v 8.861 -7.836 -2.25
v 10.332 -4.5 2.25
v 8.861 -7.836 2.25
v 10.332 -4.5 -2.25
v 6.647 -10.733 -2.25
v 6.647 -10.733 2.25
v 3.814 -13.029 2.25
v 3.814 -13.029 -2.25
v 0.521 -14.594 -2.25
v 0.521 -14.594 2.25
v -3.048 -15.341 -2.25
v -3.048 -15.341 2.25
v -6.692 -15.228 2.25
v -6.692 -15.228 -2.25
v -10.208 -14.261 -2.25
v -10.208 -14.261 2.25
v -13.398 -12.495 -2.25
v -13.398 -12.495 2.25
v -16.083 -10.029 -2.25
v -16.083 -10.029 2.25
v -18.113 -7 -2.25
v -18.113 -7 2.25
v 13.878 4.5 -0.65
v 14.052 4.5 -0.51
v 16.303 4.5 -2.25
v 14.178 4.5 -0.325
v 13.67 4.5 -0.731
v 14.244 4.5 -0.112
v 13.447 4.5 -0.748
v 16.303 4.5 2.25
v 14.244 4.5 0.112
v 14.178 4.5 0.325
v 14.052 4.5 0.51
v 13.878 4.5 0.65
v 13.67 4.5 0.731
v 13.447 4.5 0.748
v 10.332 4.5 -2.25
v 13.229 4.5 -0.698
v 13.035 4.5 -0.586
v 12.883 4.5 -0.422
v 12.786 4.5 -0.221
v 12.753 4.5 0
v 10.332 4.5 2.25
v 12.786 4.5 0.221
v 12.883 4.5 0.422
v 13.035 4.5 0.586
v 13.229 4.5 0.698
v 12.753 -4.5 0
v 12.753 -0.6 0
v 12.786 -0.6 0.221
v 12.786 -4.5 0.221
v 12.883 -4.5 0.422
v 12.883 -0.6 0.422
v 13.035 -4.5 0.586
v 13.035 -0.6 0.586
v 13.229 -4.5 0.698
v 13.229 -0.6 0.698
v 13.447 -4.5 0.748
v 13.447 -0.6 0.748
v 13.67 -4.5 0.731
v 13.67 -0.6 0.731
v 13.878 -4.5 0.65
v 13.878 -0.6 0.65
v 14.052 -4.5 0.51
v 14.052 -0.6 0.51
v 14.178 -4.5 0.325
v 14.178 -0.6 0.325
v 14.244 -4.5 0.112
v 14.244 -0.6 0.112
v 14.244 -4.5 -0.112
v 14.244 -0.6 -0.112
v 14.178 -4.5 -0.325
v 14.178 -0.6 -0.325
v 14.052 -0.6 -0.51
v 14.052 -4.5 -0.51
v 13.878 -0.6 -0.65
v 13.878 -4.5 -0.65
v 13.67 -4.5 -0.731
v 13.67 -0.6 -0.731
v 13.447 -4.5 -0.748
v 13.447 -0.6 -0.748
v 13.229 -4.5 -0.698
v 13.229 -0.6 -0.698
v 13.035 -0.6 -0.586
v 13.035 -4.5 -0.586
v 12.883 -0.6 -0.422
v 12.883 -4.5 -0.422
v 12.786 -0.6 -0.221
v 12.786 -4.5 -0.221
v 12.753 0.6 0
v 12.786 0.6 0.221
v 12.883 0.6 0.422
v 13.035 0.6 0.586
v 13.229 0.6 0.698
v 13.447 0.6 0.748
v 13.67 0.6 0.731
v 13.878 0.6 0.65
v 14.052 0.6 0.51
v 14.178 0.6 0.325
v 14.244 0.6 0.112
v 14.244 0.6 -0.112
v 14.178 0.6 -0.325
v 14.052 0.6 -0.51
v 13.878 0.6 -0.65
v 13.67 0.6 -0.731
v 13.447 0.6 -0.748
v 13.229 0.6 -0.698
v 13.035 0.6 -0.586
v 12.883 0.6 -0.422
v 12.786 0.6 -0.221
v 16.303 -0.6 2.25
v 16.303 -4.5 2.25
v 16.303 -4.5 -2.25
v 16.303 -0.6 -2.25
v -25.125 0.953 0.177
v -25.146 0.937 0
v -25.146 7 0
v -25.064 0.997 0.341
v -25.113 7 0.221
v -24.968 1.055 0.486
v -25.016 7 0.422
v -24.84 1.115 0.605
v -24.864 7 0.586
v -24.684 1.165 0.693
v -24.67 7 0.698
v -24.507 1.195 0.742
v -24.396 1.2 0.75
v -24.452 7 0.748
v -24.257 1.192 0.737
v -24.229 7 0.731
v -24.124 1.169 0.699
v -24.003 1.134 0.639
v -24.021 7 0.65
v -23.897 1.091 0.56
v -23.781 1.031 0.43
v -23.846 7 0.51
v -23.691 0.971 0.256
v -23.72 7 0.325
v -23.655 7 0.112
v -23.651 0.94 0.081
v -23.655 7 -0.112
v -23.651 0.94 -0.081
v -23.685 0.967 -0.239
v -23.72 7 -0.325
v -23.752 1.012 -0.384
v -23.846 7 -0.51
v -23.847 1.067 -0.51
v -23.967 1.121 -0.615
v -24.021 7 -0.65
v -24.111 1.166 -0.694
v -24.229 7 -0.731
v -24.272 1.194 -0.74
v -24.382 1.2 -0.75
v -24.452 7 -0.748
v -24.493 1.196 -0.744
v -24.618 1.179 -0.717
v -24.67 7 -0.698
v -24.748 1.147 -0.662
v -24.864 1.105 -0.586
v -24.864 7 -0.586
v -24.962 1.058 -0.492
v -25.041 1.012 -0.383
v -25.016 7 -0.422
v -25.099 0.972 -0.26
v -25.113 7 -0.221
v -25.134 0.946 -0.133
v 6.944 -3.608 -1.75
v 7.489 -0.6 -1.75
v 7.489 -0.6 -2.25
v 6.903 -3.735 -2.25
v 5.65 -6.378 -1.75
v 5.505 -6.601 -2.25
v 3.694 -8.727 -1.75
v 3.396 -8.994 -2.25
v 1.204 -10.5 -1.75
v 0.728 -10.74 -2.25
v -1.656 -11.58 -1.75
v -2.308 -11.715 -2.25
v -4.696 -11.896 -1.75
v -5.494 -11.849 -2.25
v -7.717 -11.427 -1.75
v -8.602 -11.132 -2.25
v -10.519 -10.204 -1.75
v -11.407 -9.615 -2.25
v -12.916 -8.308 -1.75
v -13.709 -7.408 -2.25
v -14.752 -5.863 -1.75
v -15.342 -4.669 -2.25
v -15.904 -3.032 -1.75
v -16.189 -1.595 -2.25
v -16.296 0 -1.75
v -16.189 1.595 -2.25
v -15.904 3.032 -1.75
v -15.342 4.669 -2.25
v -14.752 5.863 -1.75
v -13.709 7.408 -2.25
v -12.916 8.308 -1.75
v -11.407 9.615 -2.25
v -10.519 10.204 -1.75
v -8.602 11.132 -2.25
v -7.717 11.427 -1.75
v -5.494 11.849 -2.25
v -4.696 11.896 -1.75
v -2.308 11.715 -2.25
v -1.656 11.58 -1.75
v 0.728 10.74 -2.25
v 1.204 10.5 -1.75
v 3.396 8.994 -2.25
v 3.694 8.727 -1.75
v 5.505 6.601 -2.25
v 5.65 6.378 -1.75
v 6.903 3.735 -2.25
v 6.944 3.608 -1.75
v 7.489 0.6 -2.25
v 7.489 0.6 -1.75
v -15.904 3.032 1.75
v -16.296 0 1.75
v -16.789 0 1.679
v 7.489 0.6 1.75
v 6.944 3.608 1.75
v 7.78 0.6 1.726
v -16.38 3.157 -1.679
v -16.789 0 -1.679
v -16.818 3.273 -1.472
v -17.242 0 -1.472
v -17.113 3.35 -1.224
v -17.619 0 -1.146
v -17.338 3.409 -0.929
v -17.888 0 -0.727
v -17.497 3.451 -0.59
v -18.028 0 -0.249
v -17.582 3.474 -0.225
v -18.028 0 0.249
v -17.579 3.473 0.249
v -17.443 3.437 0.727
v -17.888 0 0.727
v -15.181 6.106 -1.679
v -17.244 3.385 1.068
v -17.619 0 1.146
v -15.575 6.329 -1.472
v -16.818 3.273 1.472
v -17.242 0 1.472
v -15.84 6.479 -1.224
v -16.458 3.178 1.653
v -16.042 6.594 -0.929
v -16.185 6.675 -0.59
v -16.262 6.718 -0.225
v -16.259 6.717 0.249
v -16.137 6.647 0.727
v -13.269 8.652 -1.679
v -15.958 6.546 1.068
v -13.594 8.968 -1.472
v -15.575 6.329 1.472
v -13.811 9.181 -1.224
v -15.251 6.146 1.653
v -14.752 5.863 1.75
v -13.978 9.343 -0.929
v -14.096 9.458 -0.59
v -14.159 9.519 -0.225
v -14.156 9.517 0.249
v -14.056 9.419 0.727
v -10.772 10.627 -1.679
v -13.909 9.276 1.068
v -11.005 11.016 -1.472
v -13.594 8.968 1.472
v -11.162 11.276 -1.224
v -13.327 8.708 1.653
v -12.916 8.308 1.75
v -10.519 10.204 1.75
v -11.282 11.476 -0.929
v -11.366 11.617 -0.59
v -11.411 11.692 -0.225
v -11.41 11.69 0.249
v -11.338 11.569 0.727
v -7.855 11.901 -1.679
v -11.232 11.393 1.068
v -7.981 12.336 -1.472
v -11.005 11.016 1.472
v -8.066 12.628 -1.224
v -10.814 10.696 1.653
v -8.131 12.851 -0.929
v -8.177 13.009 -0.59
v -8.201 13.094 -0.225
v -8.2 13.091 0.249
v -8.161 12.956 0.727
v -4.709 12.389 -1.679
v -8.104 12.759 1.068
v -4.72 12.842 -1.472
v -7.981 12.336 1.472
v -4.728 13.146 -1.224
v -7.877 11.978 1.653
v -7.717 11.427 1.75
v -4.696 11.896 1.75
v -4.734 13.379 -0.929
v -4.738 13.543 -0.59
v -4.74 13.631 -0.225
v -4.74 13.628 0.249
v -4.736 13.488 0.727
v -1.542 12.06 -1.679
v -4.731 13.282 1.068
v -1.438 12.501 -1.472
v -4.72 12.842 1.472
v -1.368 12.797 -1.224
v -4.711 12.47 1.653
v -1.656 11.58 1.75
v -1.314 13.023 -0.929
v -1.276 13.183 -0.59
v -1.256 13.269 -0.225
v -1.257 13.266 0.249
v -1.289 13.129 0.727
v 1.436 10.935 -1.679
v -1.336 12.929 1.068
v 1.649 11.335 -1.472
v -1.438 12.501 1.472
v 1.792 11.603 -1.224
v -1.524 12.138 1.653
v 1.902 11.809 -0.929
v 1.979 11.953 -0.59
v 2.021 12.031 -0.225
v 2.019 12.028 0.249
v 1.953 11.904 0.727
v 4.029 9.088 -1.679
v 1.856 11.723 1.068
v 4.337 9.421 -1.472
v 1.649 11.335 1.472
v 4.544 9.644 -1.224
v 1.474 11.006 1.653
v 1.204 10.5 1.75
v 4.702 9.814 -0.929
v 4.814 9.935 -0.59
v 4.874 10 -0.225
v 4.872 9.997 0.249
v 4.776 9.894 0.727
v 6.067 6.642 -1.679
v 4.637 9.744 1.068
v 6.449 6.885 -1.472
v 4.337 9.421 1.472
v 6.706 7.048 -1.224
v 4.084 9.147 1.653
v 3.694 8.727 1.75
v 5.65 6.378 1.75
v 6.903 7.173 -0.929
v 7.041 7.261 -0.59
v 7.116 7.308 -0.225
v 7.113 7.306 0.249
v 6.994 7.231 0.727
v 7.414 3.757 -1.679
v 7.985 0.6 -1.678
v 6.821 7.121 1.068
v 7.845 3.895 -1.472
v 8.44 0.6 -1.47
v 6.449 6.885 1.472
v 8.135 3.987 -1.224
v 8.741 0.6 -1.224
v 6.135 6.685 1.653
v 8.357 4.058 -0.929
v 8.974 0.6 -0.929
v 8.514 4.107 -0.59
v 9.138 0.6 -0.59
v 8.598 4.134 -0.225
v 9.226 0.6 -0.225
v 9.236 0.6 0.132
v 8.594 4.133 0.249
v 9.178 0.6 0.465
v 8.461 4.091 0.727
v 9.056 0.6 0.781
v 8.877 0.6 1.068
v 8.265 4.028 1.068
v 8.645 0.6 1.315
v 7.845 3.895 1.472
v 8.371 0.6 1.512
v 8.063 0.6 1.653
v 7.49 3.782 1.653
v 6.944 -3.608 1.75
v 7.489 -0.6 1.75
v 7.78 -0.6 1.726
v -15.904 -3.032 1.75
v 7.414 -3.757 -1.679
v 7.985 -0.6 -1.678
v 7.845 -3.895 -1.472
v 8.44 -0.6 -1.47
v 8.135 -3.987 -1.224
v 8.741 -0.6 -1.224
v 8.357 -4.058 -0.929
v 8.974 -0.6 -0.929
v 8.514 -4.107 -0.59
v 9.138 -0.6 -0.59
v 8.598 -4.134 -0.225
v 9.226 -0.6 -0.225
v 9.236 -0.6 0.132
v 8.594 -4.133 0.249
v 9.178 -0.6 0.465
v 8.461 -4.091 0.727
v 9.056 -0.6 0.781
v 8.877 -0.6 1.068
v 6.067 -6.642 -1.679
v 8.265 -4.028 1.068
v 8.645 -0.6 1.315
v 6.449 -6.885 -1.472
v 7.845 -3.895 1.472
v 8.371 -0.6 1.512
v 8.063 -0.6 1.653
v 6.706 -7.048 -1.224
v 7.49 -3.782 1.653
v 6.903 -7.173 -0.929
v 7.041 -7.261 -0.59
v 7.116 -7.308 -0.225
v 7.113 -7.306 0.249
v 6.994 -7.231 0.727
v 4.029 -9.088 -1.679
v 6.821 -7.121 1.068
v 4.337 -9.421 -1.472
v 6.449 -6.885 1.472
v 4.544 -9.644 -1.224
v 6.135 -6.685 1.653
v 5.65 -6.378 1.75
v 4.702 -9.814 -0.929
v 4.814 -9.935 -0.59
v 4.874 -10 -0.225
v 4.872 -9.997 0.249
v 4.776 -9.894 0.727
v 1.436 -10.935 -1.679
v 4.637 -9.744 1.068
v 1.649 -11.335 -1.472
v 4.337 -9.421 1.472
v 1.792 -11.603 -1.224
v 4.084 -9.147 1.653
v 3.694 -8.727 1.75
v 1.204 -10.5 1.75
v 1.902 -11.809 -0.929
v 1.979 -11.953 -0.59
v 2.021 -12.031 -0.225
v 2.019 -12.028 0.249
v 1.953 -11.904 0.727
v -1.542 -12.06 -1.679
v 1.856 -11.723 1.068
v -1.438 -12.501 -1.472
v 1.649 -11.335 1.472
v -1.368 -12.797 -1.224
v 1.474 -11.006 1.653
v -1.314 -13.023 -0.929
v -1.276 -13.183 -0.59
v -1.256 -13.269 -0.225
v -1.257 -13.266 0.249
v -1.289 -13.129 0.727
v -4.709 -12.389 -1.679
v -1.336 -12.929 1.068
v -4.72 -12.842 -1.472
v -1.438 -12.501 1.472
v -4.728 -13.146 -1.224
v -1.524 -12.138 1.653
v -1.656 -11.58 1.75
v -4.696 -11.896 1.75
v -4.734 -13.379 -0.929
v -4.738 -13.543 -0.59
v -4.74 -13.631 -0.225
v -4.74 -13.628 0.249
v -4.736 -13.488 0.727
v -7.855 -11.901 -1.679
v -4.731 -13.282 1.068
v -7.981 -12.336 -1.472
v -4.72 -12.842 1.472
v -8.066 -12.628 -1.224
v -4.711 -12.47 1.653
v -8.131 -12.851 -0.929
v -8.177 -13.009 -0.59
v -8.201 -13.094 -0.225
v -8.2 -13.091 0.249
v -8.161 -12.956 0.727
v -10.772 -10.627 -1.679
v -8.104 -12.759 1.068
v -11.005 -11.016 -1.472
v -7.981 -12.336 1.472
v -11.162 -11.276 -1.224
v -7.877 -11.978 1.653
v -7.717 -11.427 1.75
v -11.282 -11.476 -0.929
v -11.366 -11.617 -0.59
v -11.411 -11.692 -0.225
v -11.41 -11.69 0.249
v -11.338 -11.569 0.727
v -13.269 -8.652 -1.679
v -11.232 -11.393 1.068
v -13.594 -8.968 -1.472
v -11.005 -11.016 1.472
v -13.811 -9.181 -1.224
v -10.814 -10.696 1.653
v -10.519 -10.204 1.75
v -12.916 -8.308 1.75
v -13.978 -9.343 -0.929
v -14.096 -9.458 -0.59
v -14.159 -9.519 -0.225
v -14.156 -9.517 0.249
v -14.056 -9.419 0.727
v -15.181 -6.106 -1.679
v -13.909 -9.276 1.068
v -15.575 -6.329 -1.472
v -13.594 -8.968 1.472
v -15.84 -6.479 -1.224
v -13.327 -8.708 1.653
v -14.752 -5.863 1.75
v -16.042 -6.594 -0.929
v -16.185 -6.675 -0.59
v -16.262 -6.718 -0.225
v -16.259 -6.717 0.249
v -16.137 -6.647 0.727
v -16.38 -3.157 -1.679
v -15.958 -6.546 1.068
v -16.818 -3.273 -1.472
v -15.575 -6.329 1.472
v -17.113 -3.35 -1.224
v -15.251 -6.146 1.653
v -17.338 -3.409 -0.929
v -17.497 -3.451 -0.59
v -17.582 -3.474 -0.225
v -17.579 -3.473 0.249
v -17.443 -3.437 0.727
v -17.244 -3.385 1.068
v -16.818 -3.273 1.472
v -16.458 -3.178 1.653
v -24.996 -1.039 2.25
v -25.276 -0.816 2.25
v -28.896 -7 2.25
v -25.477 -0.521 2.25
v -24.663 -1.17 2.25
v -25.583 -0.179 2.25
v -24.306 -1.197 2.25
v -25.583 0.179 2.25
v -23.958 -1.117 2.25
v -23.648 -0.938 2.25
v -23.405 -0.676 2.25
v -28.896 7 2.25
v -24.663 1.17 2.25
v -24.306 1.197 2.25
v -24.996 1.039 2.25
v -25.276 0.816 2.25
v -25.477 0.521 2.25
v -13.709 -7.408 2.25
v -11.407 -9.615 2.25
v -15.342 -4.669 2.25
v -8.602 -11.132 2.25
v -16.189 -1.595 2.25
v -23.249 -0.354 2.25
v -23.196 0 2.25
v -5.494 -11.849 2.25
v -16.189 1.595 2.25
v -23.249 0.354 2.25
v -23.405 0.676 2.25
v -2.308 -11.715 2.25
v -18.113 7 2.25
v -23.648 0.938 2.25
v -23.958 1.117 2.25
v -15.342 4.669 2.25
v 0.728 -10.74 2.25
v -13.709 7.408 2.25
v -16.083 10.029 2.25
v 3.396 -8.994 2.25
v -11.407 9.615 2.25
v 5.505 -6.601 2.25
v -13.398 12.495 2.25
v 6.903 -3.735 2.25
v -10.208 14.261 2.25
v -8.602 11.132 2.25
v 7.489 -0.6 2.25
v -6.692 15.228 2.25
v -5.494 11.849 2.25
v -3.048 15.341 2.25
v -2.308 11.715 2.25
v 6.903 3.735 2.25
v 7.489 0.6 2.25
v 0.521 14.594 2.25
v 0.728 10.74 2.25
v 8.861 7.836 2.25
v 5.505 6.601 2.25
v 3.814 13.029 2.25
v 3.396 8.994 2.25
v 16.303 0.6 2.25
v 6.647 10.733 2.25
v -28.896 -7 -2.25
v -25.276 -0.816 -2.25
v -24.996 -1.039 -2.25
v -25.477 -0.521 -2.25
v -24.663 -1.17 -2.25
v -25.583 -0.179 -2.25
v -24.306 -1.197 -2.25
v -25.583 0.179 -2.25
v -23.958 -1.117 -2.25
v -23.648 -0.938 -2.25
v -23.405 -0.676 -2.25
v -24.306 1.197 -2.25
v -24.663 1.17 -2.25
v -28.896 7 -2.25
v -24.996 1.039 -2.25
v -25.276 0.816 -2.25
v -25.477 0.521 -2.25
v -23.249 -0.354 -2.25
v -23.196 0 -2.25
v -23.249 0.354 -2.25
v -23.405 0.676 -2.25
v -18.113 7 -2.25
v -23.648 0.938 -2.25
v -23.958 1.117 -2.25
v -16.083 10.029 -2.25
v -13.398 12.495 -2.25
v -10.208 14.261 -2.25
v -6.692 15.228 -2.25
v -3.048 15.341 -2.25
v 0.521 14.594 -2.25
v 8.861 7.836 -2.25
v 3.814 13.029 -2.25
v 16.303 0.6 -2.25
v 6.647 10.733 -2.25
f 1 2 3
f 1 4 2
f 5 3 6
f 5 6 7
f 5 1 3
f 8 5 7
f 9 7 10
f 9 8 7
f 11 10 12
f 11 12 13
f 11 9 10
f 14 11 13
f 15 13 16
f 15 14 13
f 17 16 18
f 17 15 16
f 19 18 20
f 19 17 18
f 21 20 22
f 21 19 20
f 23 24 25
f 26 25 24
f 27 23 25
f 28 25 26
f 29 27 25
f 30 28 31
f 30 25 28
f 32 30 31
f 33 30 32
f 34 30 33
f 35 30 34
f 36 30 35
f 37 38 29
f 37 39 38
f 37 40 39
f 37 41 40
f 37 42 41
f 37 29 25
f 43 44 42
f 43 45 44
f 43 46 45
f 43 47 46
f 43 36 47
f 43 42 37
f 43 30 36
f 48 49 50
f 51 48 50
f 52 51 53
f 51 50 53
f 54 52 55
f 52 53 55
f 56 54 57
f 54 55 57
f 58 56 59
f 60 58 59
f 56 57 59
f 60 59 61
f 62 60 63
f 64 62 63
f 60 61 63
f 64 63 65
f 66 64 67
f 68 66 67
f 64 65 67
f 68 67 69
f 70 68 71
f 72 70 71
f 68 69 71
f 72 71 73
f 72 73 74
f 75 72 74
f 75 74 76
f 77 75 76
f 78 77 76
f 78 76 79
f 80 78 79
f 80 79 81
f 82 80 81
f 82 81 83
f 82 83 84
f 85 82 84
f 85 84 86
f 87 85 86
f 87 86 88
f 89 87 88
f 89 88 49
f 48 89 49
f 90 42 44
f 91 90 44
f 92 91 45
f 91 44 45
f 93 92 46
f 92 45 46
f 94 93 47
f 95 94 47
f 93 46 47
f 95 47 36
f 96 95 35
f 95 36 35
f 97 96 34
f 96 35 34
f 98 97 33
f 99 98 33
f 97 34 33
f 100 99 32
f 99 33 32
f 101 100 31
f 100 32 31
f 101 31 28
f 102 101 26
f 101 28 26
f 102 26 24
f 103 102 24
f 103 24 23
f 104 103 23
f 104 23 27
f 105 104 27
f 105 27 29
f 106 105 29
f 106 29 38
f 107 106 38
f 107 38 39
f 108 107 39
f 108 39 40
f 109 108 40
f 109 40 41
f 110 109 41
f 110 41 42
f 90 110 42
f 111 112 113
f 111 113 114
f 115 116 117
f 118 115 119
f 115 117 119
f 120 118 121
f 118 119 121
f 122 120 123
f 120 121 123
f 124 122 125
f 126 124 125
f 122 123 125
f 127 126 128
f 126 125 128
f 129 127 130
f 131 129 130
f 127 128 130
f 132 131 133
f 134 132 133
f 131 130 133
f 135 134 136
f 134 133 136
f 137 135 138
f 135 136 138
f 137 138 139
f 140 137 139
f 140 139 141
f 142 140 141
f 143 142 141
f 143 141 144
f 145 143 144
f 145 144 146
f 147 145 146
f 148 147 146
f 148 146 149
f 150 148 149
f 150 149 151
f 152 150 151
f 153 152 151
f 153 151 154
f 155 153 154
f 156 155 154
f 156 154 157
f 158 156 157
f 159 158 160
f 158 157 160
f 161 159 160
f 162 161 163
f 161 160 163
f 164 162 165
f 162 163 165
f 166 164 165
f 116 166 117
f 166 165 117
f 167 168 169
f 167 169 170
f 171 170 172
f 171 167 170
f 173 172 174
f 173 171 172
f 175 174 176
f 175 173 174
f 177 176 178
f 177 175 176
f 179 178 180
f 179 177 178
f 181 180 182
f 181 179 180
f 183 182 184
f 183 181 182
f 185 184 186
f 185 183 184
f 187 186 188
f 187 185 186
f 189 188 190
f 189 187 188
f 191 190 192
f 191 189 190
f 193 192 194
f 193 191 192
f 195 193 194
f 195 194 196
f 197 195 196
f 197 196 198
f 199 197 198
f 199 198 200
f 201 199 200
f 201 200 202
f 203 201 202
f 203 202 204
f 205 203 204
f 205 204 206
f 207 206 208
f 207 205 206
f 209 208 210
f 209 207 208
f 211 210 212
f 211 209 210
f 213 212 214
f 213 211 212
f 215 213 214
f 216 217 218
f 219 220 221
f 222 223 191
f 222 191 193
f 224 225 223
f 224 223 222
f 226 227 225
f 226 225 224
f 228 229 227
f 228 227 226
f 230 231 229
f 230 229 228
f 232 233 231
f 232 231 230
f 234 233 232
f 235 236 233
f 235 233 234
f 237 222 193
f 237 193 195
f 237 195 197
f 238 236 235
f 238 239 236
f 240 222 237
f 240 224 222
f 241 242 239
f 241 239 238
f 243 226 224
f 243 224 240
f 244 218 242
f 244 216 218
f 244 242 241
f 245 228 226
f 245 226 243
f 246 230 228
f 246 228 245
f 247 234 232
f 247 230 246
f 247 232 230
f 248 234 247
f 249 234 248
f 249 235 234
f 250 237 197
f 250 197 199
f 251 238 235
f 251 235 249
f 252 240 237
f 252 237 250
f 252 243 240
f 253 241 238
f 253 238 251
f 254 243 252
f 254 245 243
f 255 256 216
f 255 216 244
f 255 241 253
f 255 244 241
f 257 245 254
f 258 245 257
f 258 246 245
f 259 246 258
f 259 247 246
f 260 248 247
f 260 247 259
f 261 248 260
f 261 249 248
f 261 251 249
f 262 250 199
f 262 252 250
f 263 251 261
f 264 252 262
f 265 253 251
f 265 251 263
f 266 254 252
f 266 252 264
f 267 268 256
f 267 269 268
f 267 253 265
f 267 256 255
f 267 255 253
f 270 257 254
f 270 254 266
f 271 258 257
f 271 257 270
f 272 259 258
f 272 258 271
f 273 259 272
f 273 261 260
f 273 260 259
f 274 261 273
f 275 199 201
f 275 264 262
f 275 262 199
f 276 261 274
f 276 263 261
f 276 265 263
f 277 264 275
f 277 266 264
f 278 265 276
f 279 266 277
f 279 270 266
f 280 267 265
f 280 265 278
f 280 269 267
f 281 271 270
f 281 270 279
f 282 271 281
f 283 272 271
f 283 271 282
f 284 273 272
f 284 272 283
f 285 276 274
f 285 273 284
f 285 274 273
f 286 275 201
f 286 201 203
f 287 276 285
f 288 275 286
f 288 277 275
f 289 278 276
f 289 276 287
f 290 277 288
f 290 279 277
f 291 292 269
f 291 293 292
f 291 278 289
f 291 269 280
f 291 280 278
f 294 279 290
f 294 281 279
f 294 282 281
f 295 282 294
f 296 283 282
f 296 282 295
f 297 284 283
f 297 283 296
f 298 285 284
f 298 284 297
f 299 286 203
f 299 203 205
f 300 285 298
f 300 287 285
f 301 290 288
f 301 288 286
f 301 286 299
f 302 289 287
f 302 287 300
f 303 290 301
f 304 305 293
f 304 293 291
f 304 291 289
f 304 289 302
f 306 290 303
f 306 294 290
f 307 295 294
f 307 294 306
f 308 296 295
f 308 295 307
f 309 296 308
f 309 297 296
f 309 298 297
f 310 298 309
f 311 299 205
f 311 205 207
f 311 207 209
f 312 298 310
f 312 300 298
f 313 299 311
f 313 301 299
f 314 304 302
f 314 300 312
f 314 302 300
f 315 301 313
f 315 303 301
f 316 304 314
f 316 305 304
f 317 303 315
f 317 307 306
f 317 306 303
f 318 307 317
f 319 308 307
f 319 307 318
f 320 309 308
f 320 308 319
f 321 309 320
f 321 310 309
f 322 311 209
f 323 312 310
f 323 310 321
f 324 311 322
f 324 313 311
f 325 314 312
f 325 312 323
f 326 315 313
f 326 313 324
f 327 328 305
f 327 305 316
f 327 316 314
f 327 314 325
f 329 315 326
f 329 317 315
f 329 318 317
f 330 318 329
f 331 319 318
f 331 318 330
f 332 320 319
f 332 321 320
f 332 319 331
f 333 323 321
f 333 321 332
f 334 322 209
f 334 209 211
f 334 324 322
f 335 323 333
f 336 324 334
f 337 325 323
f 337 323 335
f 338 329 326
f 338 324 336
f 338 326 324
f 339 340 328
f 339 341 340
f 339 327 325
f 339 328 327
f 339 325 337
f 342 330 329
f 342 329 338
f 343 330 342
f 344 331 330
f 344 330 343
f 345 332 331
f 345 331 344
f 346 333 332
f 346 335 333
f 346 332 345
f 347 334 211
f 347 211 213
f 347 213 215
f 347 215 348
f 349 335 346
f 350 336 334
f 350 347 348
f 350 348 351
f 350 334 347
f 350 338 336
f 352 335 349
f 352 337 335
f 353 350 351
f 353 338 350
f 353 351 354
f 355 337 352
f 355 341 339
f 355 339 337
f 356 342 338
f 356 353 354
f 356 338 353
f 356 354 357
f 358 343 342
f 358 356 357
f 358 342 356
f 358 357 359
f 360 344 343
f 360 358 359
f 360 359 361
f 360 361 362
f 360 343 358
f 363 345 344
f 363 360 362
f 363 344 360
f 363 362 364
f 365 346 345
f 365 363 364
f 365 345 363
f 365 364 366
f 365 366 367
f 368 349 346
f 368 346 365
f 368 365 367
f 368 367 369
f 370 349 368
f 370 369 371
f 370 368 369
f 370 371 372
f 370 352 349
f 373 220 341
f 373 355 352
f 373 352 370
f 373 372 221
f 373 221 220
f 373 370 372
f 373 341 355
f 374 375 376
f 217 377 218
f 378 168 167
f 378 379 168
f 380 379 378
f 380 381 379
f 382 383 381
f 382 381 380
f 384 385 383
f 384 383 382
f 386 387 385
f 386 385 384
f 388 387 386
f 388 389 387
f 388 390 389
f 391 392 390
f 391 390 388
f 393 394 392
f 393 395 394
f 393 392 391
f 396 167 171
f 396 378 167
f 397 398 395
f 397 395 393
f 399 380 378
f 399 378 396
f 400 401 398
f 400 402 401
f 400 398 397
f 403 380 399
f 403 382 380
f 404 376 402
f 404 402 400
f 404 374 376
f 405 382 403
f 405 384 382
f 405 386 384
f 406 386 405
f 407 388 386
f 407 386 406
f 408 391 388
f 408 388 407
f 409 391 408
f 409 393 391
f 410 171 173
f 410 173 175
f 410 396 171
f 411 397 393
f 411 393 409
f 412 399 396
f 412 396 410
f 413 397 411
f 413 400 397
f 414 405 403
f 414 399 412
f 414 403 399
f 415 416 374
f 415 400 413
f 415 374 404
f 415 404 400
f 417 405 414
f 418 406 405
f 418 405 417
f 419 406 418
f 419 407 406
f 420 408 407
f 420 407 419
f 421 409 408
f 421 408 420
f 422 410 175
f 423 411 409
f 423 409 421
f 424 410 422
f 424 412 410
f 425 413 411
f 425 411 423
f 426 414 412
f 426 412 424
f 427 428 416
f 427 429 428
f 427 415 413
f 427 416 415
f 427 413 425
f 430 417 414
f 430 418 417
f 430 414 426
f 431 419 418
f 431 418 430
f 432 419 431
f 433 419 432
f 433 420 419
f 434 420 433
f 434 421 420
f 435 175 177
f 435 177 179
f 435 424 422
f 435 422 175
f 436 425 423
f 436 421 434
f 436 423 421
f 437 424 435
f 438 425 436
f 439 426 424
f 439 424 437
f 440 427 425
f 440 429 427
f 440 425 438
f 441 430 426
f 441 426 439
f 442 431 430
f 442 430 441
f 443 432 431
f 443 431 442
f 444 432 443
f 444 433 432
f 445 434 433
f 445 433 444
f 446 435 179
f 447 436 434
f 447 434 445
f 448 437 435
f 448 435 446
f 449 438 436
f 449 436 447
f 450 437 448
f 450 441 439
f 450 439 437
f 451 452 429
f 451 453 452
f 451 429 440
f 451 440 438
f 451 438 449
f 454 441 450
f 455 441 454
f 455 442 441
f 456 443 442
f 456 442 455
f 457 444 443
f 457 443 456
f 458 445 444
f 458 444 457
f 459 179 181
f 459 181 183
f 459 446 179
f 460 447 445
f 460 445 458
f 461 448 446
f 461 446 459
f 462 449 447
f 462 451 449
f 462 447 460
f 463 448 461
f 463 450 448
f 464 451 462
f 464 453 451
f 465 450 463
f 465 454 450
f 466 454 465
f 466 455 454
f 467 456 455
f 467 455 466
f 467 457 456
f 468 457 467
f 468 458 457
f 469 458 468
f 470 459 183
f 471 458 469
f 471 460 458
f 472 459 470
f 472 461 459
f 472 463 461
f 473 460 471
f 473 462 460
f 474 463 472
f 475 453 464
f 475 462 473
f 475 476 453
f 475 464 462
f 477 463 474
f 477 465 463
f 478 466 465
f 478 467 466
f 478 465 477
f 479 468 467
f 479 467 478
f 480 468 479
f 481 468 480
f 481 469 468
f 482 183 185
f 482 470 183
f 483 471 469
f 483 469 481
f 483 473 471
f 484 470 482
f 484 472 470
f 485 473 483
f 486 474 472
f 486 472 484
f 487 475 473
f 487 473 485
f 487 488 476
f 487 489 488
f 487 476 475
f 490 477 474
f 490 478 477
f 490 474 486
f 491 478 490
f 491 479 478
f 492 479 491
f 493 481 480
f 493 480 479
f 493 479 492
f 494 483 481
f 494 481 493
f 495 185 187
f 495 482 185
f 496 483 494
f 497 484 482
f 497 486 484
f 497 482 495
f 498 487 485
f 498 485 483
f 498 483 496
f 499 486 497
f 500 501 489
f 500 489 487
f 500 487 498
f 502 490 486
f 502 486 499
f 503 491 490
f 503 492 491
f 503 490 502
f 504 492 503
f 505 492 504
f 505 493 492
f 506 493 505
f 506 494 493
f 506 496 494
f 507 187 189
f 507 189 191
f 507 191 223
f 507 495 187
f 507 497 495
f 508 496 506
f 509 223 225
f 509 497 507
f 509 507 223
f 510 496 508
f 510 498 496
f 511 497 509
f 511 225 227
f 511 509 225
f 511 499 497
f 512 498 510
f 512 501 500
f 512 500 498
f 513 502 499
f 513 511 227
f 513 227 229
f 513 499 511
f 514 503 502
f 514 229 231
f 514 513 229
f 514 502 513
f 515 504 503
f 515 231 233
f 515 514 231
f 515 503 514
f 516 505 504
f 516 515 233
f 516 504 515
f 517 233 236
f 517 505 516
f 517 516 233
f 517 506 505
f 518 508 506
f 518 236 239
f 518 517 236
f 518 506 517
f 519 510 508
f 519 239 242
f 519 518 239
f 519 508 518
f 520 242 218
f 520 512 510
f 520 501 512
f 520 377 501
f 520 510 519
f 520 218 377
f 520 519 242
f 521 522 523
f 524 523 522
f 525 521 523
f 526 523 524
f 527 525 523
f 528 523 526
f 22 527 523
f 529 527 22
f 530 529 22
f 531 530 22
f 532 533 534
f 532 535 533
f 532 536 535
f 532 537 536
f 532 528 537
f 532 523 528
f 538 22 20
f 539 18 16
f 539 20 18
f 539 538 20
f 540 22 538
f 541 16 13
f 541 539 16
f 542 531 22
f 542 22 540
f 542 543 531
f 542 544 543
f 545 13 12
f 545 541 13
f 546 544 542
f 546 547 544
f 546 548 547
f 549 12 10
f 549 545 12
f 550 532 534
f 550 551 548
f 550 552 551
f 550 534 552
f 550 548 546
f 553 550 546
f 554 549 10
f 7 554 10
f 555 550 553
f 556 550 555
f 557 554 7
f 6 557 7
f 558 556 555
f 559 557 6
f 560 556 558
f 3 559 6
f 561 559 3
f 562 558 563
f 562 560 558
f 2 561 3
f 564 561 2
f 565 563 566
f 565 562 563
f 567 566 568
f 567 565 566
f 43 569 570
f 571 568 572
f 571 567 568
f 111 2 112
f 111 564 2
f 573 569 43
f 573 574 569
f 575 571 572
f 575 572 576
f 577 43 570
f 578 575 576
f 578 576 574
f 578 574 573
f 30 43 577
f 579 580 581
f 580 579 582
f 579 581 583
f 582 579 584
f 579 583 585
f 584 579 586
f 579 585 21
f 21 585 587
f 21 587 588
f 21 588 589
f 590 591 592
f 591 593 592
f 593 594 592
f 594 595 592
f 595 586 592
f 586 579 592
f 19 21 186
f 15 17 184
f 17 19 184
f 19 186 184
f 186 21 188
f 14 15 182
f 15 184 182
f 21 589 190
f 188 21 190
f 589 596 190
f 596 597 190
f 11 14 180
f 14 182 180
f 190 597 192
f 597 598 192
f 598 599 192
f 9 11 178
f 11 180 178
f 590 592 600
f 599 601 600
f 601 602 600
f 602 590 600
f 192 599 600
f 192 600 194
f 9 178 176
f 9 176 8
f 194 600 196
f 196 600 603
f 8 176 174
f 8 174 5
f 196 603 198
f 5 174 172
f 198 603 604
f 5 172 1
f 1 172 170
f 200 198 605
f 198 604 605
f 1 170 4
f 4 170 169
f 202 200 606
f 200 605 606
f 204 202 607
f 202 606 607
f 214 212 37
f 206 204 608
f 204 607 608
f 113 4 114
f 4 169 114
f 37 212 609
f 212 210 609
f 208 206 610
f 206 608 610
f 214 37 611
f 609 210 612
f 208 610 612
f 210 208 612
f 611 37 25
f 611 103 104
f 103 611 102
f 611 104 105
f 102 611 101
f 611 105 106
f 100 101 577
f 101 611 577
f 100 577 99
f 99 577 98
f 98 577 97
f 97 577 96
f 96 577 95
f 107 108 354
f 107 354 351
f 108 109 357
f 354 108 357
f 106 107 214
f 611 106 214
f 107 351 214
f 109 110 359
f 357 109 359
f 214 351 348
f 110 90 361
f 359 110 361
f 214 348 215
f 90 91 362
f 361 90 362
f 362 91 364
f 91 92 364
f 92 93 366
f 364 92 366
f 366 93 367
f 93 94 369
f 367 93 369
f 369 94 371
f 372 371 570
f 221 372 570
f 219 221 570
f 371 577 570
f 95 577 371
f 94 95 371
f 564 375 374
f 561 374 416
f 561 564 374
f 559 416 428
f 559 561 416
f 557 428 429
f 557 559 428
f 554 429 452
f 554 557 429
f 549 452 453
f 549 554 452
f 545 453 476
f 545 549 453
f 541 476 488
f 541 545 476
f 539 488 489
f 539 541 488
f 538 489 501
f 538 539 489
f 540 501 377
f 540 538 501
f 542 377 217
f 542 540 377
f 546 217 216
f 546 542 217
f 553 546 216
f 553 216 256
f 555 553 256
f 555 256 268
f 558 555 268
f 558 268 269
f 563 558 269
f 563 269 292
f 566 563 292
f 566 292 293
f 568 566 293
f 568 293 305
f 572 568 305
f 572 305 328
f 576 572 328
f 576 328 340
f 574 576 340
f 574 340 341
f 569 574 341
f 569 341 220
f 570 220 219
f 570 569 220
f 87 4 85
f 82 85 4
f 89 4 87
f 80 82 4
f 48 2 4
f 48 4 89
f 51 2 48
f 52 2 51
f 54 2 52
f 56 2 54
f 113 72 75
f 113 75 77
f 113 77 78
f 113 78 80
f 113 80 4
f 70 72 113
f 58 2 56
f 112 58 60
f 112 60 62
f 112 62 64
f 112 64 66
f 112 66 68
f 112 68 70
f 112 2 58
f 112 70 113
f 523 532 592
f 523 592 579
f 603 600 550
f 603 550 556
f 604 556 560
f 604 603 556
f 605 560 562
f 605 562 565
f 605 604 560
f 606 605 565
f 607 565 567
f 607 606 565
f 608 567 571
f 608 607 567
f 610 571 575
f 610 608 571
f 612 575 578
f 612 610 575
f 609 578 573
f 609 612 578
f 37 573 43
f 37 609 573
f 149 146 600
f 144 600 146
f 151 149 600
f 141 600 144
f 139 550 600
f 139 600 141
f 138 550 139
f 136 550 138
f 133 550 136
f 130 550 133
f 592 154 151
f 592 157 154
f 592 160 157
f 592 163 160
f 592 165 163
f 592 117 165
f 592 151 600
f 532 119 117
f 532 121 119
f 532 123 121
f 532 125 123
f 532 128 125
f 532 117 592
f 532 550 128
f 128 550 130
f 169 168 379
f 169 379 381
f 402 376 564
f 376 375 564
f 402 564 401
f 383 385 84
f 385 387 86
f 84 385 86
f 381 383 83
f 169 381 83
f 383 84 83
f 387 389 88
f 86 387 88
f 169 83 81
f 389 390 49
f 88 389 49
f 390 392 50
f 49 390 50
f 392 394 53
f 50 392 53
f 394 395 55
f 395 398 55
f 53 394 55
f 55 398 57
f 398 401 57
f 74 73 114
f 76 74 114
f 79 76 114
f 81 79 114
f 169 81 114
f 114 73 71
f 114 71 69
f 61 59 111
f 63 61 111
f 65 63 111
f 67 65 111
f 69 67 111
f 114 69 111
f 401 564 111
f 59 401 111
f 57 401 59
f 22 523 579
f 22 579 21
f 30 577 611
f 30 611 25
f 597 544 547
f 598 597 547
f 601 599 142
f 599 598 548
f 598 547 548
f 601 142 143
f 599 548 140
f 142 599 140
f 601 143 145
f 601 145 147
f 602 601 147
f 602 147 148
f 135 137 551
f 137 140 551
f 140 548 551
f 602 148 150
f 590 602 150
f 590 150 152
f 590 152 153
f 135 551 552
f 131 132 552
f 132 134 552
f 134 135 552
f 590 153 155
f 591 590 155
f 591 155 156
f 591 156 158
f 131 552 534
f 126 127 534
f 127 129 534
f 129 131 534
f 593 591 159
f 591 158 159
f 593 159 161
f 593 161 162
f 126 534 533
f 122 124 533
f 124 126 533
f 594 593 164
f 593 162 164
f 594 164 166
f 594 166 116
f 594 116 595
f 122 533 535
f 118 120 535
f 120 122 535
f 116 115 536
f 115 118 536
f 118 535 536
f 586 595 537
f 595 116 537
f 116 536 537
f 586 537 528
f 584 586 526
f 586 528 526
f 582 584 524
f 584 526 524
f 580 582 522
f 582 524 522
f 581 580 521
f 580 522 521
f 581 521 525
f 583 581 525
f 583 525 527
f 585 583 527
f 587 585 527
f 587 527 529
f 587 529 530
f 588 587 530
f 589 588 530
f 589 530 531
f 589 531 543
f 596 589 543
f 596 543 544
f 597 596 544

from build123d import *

# Parameters (mm, degrees)
F2_R     = 1.2
F3_DEPTH = 4.5
F4_R     = 0.75
F5_DEPTH = 7
F6_R     = 0.75
F7_DEPTH = 25
F9_DEPTH = 25


with BuildPart() as f1:
    # F0 (on Front) → F1 (revolve)
    with BuildSketch(Plane.XZ):
        with BuildLine():
            ThreePointArc((-16.2961422592, -2.25), (-18.5461422592, 0), (-16.2961422592, 2.25))
            Line((-16.2961422592, 2.25), (-19.7961422592, 2.25))
            Line((-19.7961422592, 2.25), (-19.7961422592, -2.25))
            Line((-19.7961422592, -2.25), (-16.2961422592, -2.25))
        make_face()
        with BuildLine():
            Line((-16.2961422592, 1.75), (-16.2961422592, 2.25))
            ThreePointArc((-16.2961422592, 2.25), (-18.5461422592, 0), (-16.2961422592, -2.25))
            Line((-16.2961422592, -2.25), (-16.2961422592, -1.75))
            ThreePointArc((-16.2961422592, -1.75), (-18.0461422592, 0), (-16.2961422592, 1.75))
        make_face()
    revolve(axis=Axis((-4.3961422592, 0, -0.5702087656), (0, 0, -1)))

    # F2 (on face) → F3 (join)
    with BuildSketch(Plane.XY.offset(2.25)):
        with BuildLine():
            ThreePointArc((-18.1132848188, -7), (-19.7961422592, 0), (-18.1132848188, 7))
            Line((-18.1132848188, 7), (-28.8961422592, 7))
            Line((-28.8961422592, 7), (-28.8961422592, -7))
            Line((-28.8961422592, -7), (-18.1132848188, -7))
        make_face()
        with Locations((-24.3961422592, 0)):
            Circle(F2_R, mode=Mode.SUBTRACT)
        with BuildLine():
            Line((16.3026824594, 4.5), (10.3317224876, 4.5))
            ThreePointArc((10.3317224876, 4.5), (10.8348970536, 2.2749596589), (11.0038577408, 0))
            ThreePointArc((11.0038577408, 0), (10.8348970536, -2.2749596589), (10.3317224876, -4.5))
            Line((10.3317224876, -4.5), (16.3026824594, -4.5))
            Line((16.3026824594, -4.5), (16.3026824594, 4.5))
        make_face()
    extrude(amount=-F3_DEPTH)

    # F4 (on face) → F5 (cut)
    with BuildSketch(Plane(origin=(0, 7, 0), x_dir=(-1, 0, 0), z_dir=(0, 1, 0))):
        with Locations((24.3961422592, 0)):
            Circle(F4_R)
    extrude(amount=-F5_DEPTH, mode=Mode.SUBTRACT)

    # F6 (on face) → F7 (cut)
    with BuildSketch(Plane(origin=(0, 4.5, 0), x_dir=(-1, 0, 0), z_dir=(0, 1, 0))):
        with Locations((-13.5026824594, 0)):
            Circle(F6_R)
    extrude(amount=-F7_DEPTH, mode=Mode.SUBTRACT)

    # F8 (on face) → F9 (cut)
    with BuildSketch(Plane.XY.offset(2.25)):
        with BuildLine():
            ThreePointArc((7.5038577408, 0), (7.50007322, 0.3000954384), (7.4887220648, 0.6))
            Line((7.4887220648, 0.6), (5.0247731139, 0.6))
            Line((5.0247731139, 0.6), (5.0247731139, -0.6))
            Line((5.0247731139, -0.6), (7.4887220648, -0.6))
            ThreePointArc((7.4887220648, -0.6), (7.50007322, -0.3000954384), (7.5038577408, 0))
        make_face()
        with BuildLine():
            Line((16.3026824594, -0.6), (16.3026824594, 0.6))
            Line((16.3026824594, 0.6), (7.4887220648, 0.6))
            ThreePointArc((7.4887220648, 0.6), (7.50007322, 0.3000954384), (7.5038577408, 0))
            ThreePointArc((7.5038577408, 0), (7.50007322, -0.3000954384), (7.4887220648, -0.6))
            Line((7.4887220648, -0.6), (16.3026824594, -0.6))
        make_face()
    extrude(amount=-F9_DEPTH, mode=Mode.SUBTRACT)


solid = f1.part
